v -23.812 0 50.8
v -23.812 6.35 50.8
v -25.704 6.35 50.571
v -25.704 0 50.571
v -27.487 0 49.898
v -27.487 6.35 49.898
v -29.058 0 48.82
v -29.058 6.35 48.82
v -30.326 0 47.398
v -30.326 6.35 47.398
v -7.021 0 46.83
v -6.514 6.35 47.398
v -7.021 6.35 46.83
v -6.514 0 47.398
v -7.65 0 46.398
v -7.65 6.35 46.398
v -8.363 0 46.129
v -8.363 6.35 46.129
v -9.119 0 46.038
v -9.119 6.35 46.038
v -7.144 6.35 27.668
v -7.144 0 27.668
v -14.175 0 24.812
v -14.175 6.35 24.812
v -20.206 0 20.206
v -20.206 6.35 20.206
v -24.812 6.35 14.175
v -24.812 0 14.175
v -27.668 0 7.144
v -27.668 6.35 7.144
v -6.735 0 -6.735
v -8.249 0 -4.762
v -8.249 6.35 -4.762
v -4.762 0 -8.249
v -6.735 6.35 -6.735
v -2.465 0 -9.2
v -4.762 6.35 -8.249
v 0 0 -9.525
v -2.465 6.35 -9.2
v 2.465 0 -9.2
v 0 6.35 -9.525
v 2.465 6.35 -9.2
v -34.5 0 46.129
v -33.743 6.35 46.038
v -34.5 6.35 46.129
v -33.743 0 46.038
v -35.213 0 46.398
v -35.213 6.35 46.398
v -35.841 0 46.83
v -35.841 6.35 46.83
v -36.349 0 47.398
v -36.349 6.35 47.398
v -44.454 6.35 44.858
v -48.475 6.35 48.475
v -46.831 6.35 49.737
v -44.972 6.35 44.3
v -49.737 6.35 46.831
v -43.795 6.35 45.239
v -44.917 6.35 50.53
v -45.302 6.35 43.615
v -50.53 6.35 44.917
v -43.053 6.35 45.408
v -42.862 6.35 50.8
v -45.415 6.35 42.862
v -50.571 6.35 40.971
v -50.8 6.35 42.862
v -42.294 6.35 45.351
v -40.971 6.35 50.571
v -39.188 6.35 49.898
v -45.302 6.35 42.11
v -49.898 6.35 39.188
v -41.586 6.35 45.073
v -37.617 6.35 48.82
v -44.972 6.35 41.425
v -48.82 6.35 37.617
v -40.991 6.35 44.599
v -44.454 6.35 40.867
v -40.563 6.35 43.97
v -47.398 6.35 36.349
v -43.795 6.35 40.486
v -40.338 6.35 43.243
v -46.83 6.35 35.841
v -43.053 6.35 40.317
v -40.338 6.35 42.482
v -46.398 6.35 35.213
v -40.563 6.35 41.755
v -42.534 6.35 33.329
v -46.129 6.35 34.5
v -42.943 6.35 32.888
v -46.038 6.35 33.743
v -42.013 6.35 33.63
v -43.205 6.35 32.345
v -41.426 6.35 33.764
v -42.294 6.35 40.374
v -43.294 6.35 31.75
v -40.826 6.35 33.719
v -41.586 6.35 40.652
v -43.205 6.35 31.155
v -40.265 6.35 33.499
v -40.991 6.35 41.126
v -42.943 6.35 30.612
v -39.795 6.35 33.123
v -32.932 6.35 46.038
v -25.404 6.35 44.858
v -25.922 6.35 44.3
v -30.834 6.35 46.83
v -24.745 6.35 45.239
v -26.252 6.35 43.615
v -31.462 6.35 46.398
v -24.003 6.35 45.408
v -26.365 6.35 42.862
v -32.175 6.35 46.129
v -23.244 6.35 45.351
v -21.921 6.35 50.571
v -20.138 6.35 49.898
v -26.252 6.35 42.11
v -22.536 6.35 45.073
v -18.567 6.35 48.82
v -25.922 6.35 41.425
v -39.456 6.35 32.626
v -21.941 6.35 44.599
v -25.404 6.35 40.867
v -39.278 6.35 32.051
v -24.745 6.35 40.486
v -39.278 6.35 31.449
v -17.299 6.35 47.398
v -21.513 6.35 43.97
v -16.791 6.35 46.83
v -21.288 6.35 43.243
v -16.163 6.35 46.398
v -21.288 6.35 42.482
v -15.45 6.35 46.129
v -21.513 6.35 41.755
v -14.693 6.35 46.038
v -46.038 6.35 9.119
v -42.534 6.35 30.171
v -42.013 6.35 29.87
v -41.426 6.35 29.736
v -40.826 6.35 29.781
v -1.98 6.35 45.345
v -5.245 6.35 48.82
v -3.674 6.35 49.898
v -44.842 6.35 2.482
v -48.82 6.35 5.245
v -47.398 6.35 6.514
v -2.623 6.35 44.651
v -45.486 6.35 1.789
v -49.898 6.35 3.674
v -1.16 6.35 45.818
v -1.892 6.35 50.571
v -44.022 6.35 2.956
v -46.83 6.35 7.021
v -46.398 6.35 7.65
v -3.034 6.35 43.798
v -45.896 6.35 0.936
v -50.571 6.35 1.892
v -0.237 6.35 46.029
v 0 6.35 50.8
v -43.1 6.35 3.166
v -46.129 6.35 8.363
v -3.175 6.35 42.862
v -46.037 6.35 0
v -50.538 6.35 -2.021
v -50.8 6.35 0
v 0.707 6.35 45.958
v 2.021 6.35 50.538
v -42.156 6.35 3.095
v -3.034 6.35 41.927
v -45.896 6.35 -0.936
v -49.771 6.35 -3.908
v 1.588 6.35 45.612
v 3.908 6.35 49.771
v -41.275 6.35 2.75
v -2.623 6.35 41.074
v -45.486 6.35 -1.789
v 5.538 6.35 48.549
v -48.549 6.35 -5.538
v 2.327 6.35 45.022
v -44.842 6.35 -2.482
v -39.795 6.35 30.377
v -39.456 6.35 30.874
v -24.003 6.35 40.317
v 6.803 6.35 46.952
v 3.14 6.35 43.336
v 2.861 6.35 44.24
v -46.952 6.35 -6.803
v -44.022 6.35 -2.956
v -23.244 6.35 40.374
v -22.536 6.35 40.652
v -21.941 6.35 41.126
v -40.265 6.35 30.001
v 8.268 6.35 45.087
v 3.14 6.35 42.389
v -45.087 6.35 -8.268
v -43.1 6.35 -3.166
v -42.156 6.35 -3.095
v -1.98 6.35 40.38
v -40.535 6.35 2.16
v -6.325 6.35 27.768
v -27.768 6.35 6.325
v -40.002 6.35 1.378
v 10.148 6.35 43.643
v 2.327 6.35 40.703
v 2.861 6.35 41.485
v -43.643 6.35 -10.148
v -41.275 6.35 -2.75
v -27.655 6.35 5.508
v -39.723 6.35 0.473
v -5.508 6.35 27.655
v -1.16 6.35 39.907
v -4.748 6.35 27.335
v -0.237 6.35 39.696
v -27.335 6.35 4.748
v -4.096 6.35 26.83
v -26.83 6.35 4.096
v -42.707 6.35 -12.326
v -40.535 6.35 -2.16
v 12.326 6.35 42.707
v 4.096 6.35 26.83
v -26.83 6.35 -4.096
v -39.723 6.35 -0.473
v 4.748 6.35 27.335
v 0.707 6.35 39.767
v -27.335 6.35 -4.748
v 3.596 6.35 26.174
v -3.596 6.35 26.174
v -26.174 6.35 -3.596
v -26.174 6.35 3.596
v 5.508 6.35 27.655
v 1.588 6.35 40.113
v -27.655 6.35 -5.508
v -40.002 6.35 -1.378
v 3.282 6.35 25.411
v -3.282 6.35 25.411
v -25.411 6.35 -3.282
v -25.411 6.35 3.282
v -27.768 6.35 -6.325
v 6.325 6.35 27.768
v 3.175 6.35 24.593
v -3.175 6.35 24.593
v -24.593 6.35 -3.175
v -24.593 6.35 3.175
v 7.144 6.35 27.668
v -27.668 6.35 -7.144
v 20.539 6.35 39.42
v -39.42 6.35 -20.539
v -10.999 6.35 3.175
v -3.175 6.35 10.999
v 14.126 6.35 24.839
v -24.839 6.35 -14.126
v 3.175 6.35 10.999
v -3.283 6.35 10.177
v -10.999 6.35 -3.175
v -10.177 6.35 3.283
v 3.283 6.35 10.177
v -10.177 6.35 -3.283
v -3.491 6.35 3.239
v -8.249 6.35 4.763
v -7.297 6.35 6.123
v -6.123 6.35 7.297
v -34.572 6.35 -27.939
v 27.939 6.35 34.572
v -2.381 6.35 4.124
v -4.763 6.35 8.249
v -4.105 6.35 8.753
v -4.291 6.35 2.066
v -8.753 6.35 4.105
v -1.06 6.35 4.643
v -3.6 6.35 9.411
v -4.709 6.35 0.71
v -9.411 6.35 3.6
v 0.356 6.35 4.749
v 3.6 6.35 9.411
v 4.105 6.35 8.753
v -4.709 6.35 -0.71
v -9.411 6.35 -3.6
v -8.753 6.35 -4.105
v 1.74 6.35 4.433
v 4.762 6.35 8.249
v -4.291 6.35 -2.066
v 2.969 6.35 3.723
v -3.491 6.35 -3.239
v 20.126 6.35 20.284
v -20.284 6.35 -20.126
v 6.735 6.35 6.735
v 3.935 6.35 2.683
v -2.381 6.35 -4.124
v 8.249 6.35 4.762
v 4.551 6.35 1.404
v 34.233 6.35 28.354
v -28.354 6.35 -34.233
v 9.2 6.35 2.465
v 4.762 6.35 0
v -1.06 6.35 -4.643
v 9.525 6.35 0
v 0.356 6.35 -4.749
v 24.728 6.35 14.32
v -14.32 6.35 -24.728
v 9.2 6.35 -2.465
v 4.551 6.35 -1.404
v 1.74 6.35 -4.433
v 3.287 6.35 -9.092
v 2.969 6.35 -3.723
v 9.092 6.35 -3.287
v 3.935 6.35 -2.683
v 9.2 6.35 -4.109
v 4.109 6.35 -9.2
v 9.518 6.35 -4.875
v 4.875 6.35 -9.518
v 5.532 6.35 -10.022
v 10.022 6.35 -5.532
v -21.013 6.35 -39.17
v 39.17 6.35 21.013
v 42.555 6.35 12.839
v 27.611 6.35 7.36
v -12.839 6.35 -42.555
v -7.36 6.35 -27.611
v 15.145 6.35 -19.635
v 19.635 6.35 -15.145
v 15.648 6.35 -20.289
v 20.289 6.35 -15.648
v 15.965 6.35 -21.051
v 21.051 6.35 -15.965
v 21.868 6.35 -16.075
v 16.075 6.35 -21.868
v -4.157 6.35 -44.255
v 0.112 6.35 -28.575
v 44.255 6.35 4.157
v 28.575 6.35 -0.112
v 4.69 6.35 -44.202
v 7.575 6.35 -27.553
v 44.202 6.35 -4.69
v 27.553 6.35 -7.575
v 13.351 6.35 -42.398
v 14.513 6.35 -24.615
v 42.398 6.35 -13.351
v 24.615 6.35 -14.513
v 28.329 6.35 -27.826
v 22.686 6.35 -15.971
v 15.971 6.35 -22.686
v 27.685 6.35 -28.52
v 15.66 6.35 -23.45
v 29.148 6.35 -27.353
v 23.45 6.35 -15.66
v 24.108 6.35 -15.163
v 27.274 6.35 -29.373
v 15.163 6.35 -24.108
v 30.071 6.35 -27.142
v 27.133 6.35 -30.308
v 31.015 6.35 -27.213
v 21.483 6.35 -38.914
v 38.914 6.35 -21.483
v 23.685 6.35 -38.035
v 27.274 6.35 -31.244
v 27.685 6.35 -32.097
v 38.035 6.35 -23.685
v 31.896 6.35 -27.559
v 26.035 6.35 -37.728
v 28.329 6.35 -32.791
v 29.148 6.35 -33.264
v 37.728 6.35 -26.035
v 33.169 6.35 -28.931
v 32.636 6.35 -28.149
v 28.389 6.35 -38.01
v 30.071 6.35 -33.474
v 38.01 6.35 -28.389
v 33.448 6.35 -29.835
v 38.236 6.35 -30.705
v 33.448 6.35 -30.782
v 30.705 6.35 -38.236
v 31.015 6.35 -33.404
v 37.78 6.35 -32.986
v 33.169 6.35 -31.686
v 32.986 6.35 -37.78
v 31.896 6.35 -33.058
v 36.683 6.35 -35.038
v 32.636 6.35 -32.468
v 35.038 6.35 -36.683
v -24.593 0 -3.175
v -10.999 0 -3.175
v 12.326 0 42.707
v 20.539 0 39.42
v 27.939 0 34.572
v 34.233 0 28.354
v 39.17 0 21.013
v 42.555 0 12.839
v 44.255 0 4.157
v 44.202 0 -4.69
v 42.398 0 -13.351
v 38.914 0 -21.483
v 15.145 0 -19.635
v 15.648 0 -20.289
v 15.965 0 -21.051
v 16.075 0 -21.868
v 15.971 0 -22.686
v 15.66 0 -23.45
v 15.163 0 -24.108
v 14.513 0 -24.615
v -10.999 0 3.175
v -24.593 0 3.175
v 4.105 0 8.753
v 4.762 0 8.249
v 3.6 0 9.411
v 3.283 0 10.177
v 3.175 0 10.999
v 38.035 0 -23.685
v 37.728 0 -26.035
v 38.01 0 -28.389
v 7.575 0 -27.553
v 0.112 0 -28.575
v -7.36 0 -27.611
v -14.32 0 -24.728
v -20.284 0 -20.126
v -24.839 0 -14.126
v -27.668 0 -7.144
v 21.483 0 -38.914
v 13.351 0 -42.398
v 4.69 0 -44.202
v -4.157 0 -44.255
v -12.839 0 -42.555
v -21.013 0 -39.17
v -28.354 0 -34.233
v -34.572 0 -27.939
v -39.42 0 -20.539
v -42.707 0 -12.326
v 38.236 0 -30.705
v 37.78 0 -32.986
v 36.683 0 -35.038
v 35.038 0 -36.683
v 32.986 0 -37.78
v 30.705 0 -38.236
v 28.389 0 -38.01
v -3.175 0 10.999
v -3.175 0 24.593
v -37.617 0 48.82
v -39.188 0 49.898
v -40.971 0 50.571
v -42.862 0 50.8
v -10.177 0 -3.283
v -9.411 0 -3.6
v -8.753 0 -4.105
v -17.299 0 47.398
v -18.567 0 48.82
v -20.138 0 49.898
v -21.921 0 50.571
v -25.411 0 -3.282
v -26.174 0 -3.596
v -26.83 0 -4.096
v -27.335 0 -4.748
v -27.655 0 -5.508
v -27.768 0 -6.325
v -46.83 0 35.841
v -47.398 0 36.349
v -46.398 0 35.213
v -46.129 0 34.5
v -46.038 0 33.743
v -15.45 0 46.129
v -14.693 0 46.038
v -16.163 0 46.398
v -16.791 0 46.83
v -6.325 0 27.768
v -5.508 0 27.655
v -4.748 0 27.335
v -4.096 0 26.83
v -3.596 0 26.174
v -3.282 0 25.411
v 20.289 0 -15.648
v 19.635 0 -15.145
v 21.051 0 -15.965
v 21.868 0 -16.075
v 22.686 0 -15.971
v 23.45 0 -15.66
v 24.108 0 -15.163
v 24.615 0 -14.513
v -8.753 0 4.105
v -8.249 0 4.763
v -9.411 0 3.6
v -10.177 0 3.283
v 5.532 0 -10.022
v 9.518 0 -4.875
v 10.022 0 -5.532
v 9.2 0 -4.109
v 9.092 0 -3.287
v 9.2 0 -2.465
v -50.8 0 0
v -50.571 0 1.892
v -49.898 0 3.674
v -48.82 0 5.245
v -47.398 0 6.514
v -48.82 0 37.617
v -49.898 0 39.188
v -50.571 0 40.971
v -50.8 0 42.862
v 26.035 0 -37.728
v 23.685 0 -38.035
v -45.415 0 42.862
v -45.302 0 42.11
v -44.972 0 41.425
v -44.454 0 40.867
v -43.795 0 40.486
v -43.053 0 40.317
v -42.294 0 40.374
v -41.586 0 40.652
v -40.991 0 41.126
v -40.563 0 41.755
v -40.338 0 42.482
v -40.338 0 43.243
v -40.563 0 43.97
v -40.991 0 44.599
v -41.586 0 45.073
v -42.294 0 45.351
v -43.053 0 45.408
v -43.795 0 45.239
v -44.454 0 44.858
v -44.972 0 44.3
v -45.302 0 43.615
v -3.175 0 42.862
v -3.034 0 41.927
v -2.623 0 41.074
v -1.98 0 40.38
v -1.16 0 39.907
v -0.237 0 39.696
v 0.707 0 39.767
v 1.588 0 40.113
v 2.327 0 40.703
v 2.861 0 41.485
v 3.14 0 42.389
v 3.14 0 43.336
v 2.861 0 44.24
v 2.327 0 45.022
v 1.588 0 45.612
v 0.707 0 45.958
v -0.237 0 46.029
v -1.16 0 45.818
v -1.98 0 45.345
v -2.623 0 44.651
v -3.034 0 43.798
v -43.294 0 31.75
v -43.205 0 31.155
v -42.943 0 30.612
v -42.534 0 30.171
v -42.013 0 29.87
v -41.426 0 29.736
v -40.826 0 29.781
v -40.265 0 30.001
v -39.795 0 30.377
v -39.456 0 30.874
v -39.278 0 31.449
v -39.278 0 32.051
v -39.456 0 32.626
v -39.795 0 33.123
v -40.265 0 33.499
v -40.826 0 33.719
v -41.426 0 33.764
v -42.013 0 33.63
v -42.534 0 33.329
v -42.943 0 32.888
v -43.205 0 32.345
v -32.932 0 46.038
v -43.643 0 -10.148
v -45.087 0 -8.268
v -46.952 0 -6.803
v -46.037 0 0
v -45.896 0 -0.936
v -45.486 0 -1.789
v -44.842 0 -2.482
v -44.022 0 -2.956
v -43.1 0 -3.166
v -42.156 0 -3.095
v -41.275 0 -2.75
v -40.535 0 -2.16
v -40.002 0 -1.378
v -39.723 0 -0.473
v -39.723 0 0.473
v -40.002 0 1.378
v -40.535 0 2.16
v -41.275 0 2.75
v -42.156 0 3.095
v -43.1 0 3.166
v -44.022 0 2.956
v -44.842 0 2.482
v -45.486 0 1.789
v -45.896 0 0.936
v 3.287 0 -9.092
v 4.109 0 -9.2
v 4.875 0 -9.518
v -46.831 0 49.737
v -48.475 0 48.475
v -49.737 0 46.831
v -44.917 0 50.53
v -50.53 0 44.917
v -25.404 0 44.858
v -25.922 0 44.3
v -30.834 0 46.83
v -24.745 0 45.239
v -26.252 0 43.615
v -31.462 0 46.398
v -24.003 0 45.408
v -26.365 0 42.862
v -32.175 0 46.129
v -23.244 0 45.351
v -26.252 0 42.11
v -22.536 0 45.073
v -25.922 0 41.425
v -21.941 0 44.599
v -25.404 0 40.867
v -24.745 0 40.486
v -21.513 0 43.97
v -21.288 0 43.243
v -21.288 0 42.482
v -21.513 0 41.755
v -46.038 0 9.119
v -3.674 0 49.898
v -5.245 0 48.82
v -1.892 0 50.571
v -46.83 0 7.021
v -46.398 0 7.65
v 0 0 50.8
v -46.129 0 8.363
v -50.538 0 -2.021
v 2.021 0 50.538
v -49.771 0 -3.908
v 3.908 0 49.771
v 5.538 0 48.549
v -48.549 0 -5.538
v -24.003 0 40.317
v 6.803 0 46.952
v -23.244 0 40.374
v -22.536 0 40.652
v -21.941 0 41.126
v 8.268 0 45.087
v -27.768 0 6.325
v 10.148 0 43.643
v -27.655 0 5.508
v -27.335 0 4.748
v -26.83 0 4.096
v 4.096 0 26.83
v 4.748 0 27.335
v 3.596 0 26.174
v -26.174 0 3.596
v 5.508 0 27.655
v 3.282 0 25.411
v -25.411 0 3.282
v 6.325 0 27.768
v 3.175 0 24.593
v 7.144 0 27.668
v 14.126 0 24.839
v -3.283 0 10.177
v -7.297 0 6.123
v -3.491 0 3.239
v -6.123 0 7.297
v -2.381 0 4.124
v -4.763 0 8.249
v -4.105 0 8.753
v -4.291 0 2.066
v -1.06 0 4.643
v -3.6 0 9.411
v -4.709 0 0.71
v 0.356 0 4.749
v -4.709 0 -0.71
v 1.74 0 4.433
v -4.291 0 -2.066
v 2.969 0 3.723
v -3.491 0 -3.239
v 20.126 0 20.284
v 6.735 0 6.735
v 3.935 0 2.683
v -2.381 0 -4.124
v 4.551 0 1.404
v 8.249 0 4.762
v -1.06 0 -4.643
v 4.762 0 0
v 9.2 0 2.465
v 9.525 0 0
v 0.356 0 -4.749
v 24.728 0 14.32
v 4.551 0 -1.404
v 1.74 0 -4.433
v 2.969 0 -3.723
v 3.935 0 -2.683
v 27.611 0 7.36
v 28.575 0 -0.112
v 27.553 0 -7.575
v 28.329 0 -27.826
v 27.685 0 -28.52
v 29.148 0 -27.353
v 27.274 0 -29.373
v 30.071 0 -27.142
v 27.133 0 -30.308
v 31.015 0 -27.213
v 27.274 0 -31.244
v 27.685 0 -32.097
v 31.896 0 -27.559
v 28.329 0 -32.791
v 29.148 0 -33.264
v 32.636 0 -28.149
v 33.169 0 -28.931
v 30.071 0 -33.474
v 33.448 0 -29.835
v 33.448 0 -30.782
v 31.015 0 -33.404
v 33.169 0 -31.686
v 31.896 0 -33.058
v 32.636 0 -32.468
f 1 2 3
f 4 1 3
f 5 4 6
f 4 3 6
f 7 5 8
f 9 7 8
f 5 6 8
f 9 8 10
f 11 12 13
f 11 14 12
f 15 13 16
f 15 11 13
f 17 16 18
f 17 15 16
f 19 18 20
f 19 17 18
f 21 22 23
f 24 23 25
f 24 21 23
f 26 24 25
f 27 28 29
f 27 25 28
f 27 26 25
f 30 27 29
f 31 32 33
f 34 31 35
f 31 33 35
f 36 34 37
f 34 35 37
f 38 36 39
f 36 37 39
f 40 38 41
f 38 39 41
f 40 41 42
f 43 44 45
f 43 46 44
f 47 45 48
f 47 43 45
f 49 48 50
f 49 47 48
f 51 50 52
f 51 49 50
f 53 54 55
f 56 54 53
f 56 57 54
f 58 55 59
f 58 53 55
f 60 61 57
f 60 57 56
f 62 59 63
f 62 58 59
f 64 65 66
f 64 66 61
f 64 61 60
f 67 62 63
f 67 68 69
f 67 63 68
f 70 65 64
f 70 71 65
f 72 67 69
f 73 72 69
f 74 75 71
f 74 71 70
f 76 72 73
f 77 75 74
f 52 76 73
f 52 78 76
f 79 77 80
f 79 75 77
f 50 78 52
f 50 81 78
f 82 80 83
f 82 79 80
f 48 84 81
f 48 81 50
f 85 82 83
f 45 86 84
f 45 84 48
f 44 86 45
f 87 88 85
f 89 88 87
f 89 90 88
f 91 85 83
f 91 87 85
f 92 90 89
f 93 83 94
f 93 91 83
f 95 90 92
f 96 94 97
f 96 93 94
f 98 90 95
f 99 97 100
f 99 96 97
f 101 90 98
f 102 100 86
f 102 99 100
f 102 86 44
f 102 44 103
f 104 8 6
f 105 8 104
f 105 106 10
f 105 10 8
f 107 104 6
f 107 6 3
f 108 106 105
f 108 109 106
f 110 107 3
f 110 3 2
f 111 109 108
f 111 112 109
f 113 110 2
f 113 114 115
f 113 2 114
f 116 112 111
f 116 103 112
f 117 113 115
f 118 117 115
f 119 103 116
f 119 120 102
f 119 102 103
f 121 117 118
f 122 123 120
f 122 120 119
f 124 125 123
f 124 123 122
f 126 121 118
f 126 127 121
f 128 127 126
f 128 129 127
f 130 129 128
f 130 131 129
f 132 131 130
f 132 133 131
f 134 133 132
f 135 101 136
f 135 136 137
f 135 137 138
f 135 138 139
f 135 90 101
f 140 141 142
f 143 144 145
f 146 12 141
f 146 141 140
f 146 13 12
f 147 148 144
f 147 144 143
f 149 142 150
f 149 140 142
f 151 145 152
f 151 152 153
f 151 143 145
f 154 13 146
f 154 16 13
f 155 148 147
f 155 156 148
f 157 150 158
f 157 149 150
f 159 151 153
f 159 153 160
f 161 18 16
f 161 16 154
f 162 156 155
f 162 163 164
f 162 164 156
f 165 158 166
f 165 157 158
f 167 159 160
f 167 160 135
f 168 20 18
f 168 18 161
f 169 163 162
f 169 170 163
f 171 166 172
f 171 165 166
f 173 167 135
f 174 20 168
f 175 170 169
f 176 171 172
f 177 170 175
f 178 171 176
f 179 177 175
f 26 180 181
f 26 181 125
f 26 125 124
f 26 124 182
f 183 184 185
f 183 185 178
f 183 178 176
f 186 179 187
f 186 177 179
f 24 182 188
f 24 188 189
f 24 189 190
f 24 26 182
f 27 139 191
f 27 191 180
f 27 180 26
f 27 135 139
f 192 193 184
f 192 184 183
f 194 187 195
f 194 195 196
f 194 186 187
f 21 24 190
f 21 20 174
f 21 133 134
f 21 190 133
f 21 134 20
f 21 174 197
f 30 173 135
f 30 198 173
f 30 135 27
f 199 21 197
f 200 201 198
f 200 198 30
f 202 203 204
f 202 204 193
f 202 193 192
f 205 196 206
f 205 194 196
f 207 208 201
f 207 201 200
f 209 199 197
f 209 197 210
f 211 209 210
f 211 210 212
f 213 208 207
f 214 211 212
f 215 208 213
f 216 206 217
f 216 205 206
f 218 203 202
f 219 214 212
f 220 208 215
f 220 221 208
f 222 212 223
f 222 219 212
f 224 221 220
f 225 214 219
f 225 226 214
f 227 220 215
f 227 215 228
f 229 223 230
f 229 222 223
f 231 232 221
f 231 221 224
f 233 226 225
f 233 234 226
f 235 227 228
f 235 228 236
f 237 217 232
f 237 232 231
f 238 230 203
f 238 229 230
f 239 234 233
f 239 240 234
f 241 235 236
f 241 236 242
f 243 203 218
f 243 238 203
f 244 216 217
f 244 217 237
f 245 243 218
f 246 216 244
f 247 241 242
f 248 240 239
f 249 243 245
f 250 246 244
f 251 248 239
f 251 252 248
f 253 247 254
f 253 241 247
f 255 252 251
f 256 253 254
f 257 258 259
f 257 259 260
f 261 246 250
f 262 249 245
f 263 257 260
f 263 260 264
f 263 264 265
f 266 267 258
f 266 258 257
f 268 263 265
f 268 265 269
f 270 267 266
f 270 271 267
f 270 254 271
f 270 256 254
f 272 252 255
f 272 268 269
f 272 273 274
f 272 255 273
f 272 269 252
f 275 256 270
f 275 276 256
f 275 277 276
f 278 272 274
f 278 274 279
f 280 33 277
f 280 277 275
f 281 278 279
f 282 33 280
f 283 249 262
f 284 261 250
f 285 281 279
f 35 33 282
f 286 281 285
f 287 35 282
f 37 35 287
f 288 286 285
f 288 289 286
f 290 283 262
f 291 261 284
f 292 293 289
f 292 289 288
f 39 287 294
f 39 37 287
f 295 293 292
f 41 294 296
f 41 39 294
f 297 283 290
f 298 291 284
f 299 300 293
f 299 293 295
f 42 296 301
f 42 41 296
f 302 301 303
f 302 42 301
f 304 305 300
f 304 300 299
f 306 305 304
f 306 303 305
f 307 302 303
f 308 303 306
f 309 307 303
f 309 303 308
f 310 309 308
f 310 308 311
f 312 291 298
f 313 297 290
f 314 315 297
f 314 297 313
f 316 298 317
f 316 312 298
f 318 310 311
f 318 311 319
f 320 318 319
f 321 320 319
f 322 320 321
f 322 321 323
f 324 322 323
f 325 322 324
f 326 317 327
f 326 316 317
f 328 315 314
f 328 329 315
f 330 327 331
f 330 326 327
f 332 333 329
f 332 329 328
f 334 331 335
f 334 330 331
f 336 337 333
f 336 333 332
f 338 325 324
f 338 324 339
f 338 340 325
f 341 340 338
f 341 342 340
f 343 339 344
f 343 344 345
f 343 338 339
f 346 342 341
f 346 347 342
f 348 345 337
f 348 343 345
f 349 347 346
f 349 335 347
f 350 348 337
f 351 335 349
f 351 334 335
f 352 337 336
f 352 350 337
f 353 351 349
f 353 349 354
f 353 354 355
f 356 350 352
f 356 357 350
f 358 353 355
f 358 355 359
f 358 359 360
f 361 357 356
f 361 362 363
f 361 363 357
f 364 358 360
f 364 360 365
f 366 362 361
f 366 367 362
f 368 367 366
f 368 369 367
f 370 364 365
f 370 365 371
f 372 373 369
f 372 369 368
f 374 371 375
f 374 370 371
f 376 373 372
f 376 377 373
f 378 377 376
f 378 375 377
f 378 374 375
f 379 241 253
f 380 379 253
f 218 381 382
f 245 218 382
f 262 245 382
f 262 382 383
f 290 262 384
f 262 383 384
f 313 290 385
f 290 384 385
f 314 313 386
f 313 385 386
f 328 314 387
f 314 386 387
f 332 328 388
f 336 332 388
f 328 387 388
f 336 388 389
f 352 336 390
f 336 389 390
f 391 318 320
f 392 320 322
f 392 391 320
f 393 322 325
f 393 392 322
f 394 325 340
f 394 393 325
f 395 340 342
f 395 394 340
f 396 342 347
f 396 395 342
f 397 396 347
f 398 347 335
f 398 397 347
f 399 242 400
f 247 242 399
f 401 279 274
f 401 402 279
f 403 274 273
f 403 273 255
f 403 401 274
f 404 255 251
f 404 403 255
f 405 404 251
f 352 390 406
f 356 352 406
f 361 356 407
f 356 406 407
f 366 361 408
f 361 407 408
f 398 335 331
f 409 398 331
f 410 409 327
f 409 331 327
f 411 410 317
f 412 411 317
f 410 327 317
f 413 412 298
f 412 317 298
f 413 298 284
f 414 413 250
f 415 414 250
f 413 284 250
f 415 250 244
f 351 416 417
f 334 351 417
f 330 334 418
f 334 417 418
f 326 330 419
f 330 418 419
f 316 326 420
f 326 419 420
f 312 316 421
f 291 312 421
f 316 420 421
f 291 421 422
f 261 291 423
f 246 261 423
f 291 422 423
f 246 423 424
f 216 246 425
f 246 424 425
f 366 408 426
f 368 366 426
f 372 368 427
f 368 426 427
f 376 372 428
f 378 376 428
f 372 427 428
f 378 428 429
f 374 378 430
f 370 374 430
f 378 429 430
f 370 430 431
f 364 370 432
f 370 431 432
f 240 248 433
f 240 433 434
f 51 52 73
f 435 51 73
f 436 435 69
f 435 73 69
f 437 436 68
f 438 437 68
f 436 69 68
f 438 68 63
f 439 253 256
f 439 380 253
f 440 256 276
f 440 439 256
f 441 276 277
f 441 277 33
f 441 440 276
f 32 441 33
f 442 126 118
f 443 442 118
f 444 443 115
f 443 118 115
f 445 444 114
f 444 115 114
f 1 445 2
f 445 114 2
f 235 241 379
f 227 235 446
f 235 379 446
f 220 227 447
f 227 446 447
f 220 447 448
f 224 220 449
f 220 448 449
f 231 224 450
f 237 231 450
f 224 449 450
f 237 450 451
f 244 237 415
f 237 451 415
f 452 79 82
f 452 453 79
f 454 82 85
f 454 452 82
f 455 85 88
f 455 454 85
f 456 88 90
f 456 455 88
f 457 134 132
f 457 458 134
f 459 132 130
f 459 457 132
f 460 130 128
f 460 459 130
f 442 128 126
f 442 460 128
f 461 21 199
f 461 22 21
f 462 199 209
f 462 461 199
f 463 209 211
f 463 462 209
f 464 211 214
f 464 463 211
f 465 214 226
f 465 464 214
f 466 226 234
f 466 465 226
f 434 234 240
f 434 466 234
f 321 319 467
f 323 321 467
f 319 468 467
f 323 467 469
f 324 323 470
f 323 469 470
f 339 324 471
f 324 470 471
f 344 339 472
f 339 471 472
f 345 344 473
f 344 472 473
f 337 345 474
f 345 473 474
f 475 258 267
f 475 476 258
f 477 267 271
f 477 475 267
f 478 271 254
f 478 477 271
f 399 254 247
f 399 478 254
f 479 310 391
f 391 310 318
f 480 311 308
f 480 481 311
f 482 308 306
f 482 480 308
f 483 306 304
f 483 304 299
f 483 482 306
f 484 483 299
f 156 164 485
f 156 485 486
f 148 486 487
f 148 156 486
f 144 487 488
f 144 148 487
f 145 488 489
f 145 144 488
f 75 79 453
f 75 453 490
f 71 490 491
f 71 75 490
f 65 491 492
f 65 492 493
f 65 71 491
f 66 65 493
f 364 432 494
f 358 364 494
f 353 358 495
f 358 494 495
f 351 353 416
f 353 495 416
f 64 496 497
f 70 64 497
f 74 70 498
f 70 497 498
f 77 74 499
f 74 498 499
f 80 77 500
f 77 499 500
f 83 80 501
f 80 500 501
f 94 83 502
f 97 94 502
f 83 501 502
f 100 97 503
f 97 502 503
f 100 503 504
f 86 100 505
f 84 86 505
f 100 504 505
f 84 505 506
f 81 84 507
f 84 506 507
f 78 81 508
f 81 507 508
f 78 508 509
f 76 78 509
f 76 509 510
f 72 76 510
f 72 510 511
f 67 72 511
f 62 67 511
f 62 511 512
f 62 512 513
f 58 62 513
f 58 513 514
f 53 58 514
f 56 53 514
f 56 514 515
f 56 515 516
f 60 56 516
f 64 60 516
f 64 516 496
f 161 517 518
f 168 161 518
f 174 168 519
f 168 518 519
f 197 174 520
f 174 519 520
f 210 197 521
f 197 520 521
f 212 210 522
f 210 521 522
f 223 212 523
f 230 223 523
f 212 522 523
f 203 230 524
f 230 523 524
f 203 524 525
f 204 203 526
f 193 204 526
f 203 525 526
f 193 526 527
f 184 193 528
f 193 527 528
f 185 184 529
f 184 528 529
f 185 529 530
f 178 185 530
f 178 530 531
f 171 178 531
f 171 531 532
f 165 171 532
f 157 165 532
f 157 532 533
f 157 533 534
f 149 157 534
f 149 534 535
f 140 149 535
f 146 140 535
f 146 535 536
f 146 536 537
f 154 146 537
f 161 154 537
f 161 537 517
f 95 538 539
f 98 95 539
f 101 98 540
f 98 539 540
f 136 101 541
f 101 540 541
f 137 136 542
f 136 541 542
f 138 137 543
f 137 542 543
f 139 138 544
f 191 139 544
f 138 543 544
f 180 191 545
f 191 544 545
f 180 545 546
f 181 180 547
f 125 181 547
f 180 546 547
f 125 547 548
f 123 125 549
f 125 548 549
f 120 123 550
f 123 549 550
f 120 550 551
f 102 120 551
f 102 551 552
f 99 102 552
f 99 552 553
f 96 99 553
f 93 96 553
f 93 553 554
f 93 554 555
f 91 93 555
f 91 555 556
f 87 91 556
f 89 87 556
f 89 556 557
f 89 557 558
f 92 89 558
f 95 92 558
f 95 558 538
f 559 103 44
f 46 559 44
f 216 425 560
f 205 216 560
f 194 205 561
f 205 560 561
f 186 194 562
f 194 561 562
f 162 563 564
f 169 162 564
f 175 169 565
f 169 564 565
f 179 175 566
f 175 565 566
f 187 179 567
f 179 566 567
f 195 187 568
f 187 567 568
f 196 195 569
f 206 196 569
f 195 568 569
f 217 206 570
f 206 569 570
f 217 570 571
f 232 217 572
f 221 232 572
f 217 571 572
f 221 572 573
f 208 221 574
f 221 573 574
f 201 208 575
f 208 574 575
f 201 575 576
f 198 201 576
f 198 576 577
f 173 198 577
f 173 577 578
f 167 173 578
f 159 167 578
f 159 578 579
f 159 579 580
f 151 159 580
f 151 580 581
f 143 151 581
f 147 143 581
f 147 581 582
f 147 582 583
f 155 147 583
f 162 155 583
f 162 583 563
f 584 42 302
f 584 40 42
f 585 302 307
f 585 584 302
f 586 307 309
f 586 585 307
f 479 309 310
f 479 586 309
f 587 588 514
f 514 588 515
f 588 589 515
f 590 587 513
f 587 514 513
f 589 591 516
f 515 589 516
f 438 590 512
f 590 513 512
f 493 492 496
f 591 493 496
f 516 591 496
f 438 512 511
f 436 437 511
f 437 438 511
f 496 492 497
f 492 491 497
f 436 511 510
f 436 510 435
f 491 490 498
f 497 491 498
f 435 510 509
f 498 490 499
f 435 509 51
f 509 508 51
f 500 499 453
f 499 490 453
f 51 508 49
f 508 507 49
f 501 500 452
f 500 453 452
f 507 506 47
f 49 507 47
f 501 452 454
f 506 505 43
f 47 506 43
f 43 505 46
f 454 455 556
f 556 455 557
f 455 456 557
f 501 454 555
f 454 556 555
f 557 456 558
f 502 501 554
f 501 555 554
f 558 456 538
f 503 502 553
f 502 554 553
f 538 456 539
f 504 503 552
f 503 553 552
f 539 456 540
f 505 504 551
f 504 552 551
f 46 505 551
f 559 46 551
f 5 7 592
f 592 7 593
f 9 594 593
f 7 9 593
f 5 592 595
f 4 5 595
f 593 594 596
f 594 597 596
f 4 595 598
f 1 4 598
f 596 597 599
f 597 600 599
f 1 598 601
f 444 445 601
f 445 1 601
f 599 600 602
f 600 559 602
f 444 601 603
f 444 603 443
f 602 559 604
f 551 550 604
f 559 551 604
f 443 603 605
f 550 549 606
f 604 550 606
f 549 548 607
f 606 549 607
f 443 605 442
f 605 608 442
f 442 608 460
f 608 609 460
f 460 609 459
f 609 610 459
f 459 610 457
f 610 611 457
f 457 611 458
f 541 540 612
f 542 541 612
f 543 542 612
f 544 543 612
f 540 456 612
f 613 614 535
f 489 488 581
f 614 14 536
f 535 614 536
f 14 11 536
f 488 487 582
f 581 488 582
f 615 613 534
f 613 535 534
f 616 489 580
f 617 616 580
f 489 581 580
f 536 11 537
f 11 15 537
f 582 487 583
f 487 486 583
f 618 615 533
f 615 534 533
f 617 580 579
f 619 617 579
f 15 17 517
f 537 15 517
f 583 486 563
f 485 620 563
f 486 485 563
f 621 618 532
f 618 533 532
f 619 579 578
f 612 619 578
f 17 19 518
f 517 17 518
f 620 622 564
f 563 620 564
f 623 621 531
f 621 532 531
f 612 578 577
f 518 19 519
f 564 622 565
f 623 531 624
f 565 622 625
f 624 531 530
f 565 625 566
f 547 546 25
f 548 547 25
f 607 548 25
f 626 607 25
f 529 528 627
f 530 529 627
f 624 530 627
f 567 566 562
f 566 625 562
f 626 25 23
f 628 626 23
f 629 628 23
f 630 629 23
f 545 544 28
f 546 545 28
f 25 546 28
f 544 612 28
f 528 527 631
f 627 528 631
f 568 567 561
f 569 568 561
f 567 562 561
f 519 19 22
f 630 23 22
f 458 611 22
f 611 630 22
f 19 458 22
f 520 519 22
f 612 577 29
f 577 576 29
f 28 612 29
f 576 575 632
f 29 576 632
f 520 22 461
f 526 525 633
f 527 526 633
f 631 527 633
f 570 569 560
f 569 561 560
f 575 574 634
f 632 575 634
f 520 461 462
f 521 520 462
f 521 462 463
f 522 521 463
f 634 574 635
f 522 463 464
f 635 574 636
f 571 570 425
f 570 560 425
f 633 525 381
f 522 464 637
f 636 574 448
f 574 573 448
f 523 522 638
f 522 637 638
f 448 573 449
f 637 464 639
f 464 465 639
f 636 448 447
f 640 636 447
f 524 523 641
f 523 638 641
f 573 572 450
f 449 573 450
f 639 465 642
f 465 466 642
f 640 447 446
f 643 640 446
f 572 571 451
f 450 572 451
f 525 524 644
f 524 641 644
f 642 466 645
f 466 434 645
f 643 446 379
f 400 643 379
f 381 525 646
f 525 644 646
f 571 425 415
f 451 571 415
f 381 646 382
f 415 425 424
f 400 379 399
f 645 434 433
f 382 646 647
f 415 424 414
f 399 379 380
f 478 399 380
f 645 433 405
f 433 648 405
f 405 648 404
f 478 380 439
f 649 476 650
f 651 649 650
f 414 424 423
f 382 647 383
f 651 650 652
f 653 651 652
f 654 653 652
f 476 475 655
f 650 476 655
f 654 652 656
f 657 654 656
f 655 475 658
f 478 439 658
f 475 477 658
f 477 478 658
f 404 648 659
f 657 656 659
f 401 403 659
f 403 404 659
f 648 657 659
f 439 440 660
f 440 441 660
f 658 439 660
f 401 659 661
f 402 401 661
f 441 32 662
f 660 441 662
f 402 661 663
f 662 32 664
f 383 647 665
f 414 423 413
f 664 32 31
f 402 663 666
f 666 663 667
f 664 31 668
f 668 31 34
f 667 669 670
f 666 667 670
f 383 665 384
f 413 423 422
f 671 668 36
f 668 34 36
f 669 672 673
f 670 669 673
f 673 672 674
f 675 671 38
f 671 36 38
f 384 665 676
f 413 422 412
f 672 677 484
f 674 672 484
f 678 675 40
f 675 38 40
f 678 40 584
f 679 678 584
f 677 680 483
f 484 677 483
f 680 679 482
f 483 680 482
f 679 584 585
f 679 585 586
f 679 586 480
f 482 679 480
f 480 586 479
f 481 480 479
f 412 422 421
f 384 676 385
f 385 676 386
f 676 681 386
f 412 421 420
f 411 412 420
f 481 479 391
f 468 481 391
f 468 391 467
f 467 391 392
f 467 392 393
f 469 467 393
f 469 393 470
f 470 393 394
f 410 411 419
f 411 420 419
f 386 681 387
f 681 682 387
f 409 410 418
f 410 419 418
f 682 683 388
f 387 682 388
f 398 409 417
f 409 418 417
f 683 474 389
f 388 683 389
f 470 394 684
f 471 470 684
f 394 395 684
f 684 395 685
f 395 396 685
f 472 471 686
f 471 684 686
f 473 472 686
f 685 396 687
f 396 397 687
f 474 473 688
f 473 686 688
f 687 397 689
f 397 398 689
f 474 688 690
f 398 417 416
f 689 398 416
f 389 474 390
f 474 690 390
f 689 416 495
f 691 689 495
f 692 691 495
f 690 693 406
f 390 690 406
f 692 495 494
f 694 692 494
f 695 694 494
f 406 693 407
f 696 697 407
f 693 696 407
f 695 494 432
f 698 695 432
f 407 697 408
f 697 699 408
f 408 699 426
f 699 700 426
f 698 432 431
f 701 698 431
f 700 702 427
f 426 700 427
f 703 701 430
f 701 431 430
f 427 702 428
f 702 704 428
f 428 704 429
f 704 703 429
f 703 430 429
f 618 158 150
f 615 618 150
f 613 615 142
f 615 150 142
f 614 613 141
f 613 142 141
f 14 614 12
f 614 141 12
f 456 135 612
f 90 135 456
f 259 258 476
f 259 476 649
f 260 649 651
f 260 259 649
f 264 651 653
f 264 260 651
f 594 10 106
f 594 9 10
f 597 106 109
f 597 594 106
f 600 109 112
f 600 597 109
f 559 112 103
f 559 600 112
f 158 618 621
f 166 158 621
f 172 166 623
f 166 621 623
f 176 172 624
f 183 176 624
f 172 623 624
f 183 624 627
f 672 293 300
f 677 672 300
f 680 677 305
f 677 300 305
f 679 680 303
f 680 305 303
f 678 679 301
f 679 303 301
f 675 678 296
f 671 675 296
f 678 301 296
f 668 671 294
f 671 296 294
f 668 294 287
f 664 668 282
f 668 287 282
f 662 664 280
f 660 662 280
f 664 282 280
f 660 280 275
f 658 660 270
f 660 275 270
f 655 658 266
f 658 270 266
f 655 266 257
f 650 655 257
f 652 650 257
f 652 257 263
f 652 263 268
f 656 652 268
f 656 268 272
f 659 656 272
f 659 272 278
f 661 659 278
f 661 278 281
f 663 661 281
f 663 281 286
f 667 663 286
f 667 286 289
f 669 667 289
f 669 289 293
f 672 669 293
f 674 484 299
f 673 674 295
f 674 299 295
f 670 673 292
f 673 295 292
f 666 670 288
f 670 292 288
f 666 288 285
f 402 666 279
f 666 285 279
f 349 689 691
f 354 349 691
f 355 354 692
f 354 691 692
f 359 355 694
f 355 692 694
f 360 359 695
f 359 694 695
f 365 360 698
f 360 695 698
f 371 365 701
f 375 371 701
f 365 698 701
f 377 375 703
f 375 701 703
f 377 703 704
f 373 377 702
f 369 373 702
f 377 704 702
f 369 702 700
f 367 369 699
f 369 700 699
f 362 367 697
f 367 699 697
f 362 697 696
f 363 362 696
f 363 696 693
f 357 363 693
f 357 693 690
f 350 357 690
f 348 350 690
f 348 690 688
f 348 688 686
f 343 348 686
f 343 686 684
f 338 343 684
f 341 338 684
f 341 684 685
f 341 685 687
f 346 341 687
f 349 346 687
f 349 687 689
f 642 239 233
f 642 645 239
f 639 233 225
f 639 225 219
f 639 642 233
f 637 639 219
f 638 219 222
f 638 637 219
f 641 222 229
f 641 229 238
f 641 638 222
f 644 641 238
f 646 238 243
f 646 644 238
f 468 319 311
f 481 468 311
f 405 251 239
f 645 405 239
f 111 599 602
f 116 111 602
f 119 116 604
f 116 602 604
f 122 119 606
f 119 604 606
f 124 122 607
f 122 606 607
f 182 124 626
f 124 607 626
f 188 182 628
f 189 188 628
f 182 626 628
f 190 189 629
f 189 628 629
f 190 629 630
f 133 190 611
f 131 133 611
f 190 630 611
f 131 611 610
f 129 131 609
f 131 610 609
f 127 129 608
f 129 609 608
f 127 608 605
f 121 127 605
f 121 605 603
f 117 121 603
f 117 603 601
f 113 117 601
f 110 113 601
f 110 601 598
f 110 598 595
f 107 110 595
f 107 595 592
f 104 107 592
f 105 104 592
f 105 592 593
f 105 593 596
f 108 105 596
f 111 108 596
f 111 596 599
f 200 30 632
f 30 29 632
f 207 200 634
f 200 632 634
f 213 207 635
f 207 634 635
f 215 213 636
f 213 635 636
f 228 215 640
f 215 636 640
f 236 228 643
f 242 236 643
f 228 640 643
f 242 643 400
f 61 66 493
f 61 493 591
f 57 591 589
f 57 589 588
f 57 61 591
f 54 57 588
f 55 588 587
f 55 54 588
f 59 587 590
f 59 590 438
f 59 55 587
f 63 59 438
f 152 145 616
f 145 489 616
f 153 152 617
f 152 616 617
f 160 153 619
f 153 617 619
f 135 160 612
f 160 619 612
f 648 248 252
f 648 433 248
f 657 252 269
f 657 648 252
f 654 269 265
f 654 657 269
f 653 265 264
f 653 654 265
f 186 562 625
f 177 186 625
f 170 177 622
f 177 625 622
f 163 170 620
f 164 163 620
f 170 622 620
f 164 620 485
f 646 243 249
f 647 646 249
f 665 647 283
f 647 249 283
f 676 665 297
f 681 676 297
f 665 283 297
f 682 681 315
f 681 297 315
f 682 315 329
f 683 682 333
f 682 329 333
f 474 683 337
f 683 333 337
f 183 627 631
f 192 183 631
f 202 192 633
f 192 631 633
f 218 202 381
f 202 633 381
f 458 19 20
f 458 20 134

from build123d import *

# Parameters (mm, degrees)
BOSS_EXTRUDE1_DEPTH         = 6.35
SKETCH2_R                   = 4.7625
CUT_EXTRUDE1_DEPTH          = 7.35
F_1_4_0_25_DIAMETER_HOLE1_D = 6.35
CUT_EXTRUDE2_DEPTH          = 7.35
FILLET1_R                   = 3.175
BOSS_EXTRUDE2_DEPTH         = 6.35
F_10_CLEARANCE_HOLE1_D      = 5.1054
CUT_EXTRUDE5_DEPTH          = 6.35
FILLET3_R                   = 3.175
F_10_32_TAPPED_HOLE1_D      = 4.0386


with BuildPart() as part:
    # Sketch1 → Boss-Extrude1 (new body)
    with BuildSketch(Plane(origin=(0, 0, 0), x_dir=(1, 0, 0), z_dir=(0, 1, 0))):
        with BuildLine():
            ThreePointArc((-42.706862745, -12.325841735), (-31.430896424, -31.430896424), (-12.325841735, -42.706862745))
            ThreePointArc((-12.325841735, -42.706862745), (-9.162618669, -44.306267621), (-6.803224334, -46.951515152))
            ThreePointArc((-6.803224334, -46.951515152), (0, -50.8), (6.803224334, -46.951515152))
            ThreePointArc((6.803224334, -46.951515152), (9.162618669, -44.306267621), (12.325841735, -42.706862745))
            ThreePointArc((12.325841735, -42.706862745), (41.06644522, -17.010278569), (38.913998525, 21.482625976))
            ThreePointArc((38.913998525, 21.482625976), (37.808212078, 24.85031249), (38.010340811, 28.38912869))
            ThreePointArc((38.010340811, 28.38912869), (35.921024484, 35.921024484), (28.38912869, 38.010340811))
            ThreePointArc((28.38912869, 38.010340811), (24.85031249, 37.808212078), (21.482625976, 38.913998525))
            ThreePointArc((21.482625976, 38.913998525), (-17.010278569, 41.06644522), (-42.706862745, 12.325841735))
            ThreePointArc((-42.706862745, 12.325841735), (-44.306267621, 9.162618669), (-46.951515152, 6.803224334))
            ThreePointArc((-46.951515152, 6.803224334), (-50.8, 0), (-46.951515152, -6.803224334))
            ThreePointArc((-46.951515152, -6.803224334), (-44.306267621, -9.162618669), (-42.706862745, -12.325841735))
        make_face()
    extrude(amount=BOSS_EXTRUDE1_DEPTH)

    # Sketch2 → Cut-Extrude1 (cut, through all)
    with BuildSketch(Plane(origin=(0, 6.35, 0), x_dir=(1, 0, 0), z_dir=(0, 1, 0))):
        Circle(SKETCH2_R)
    extrude(amount=-CUT_EXTRUDE1_DEPTH, mode=Mode.SUBTRACT)

    # 1/4 (0.25) Diameter Hole1 (through all)
    with Locations(Plane(origin=(0, 6.35, 0), x_dir=(1, 0, 0), z_dir=(0, 1, 0))):
        with Locations((-42.8625, 0), (30.308364409, 30.308364409), (0, -42.8625)):
            Hole(F_1_4_0_25_DIAMETER_HOLE1_D / 2)

    # Sketch5 → Cut-Extrude2 (cut, through all)
    with BuildSketch(Plane(origin=(0, 6.35, 0), x_dir=(1, 0, 0), z_dir=(0, 1, 0))):
        with BuildLine():
            Line((-28.398063314, 3.175), (-8.980256121, 3.175))
            ThreePointArc((-8.980256121, 3.175), (-3.645059693, 8.799952547), (4.10493597, 8.59506403))
            Line((4.10493597, 8.59506403), (17.835399112, 22.325527172))
            ThreePointArc((17.835399112, 22.325527172), (-10.93517908, 26.399857642), (-28.398063314, 3.175))
        make_face()
        with BuildLine():
            Line((-28.398063314, -3.175), (-8.980256121, -3.175))
            ThreePointArc((-8.980256121, -3.175), (-6.735192091, -6.735192091), (-3.175, -8.980256121))
            Line((-3.175, -8.980256121), (-3.175, -28.398063314))
            ThreePointArc((-3.175, -28.398063314), (-20.205576272, -20.205576272), (-28.398063314, -3.175))
        make_face()
        with BuildLine():
            Line((22.325527172, 17.835399112), (8.59506403, 4.10493597))
            ThreePointArc((8.59506403, 4.10493597), (8.799952547, -3.645059693), (3.175, -8.980256121))
            Line((3.175, -8.980256121), (3.175, -28.398063314))
            ThreePointArc((3.175, -28.398063314), (26.399857642, -10.93517908), (22.325527172, 17.835399112))
        make_face()
    extrude(amount=-CUT_EXTRUDE2_DEPTH, mode=Mode.SUBTRACT)

    # Fillet1
    fillet1_edges = [part.edges().sort_by_distance(p)[0] for p in [
        (22.325527172, 3.175, -17.835399112),
        (3.175, 3.175, 28.398063314),
        (3.175, 3.175, 8.980256121),
        (8.59506403, 3.175, -4.10493597),
        (-3.175, 3.175, 28.398063314),
        (-28.398063314, 3.175, 3.175),
        (-8.980256121, 3.175, 3.175),
        (-3.175, 3.175, 8.980256121),
        (-28.398063314, 3.175, -3.175),
        (17.835399112, 3.175, -22.325527172),
        (4.10493597, 3.175, -8.59506403),
        (-8.980256121, 3.175, -3.175),
    ]]
    fillet(fillet1_edges, radius=FILLET1_R)

    # Sketch8 → Boss-Extrude2 (add)
    with BuildSketch(Plane(origin=(0, 6.35, 0), x_dir=(1, 0, 0), z_dir=(0, 1, 0))):
        with BuildLine():
            Line((-50.8, 0), (-50.8, -42.8625))
            ThreePointArc((-50.8, -42.8625), (-48.475160076, -48.475160076), (-42.8625, -50.8))
            Line((-42.8625, -50.8), (0, -50.8))
            ThreePointArc((0, -50.8), (-3.908154839, -49.771206971), (-6.803224334, -46.951515152))
            ThreePointArc((-6.803224334, -46.951515152), (-9.162618669, -44.306267621), (-12.325841735, -42.706862745))
            ThreePointArc((-12.325841735, -42.706862745), (-31.430896424, -31.430896424), (-42.706862745, -12.325841735))
            ThreePointArc((-42.706862745, -12.325841735), (-44.306267621, -9.162618669), (-46.951515152, -6.803224334))
            ThreePointArc((-46.951515152, -6.803224334), (-49.771206971, -3.908154839), (-50.8, 0))
        make_face()
    extrude(amount=-BOSS_EXTRUDE2_DEPTH)

    # #10 Clearance Hole1 (through all)
    with Locations(Plane(origin=(0, 6.35, 0), x_dir=(1, 0, 0), z_dir=(0, 1, 0))):
        with Locations((-42.8625, -42.8625), (-23.8125, -42.8625)):
            Hole(F_10_CLEARANCE_HOLE1_D / 2)

    # Sketch15 → Cut-Extrude5 (cut)
    with BuildSketch(Plane(origin=(0, 6.35, 0), x_dir=(1, 0, 0), z_dir=(0, 1, 0))):
        with BuildLine():
            ThreePointArc((-46.0375, -35.587661084), (-49.503488961, -38.5149522), (-50.8, -42.8625))
            Line((-50.8, -42.8625), (-50.8, 0))
            ThreePointArc((-50.8, 0), (-49.503488961, -4.3475478), (-46.0375, -7.274838916))
            Line((-46.0375, -7.274838916), (-46.0375, -35.587661084))
        make_face()
        with BuildLine():
            Line((-31.087338916, -46.0375), (-35.587661084, -46.0375))
            ThreePointArc((-35.587661084, -46.0375), (-38.5149522, -49.503488961), (-42.8625, -50.8))
            Line((-42.8625, -50.8), (-23.8125, -50.8))
            ThreePointArc((-23.8125, -50.8), (-28.1600478, -49.503488961), (-31.087338916, -46.0375))
        make_face()
        with BuildLine():
            ThreePointArc((-16.537661084, -46.0375), (-19.4649522, -49.503488961), (-23.8125, -50.8))
            Line((-23.8125, -50.8), (0, -50.8))
            ThreePointArc((0, -50.8), (-4.3475478, -49.503488961), (-7.274838916, -46.0375))
            Line((-7.274838916, -46.0375), (-16.537661084, -46.0375))
        make_face()
    extrude(amount=-CUT_EXTRUDE5_DEPTH, mode=Mode.SUBTRACT)

    # Fillet3
    fillet3_edges = [part.edges().sort_by_distance(p)[0] for p in [
        (-46.0375, 3.175, 35.587661084),
        (-46.0375, 3.175, 7.274838916),
        (-35.587661084, 3.175, 46.0375),
        (-31.087338916, 3.175, 46.0375),
        (-16.537661084, 3.175, 46.0375),
        (-7.274838916, 3.175, 46.0375),
    ]]
    fillet(fillet3_edges, radius=FILLET3_R)

    # #10-32 Tapped Hole1 (through all)
    with Locations(Plane(origin=(0, 6.35, 0), x_dir=(1, 0, 0), z_dir=(0, 1, 0))):
        with Locations((-41.275, -31.75)):
            Hole(F_10_32_TAPPED_HOLE1_D / 2)


solid = part.part
